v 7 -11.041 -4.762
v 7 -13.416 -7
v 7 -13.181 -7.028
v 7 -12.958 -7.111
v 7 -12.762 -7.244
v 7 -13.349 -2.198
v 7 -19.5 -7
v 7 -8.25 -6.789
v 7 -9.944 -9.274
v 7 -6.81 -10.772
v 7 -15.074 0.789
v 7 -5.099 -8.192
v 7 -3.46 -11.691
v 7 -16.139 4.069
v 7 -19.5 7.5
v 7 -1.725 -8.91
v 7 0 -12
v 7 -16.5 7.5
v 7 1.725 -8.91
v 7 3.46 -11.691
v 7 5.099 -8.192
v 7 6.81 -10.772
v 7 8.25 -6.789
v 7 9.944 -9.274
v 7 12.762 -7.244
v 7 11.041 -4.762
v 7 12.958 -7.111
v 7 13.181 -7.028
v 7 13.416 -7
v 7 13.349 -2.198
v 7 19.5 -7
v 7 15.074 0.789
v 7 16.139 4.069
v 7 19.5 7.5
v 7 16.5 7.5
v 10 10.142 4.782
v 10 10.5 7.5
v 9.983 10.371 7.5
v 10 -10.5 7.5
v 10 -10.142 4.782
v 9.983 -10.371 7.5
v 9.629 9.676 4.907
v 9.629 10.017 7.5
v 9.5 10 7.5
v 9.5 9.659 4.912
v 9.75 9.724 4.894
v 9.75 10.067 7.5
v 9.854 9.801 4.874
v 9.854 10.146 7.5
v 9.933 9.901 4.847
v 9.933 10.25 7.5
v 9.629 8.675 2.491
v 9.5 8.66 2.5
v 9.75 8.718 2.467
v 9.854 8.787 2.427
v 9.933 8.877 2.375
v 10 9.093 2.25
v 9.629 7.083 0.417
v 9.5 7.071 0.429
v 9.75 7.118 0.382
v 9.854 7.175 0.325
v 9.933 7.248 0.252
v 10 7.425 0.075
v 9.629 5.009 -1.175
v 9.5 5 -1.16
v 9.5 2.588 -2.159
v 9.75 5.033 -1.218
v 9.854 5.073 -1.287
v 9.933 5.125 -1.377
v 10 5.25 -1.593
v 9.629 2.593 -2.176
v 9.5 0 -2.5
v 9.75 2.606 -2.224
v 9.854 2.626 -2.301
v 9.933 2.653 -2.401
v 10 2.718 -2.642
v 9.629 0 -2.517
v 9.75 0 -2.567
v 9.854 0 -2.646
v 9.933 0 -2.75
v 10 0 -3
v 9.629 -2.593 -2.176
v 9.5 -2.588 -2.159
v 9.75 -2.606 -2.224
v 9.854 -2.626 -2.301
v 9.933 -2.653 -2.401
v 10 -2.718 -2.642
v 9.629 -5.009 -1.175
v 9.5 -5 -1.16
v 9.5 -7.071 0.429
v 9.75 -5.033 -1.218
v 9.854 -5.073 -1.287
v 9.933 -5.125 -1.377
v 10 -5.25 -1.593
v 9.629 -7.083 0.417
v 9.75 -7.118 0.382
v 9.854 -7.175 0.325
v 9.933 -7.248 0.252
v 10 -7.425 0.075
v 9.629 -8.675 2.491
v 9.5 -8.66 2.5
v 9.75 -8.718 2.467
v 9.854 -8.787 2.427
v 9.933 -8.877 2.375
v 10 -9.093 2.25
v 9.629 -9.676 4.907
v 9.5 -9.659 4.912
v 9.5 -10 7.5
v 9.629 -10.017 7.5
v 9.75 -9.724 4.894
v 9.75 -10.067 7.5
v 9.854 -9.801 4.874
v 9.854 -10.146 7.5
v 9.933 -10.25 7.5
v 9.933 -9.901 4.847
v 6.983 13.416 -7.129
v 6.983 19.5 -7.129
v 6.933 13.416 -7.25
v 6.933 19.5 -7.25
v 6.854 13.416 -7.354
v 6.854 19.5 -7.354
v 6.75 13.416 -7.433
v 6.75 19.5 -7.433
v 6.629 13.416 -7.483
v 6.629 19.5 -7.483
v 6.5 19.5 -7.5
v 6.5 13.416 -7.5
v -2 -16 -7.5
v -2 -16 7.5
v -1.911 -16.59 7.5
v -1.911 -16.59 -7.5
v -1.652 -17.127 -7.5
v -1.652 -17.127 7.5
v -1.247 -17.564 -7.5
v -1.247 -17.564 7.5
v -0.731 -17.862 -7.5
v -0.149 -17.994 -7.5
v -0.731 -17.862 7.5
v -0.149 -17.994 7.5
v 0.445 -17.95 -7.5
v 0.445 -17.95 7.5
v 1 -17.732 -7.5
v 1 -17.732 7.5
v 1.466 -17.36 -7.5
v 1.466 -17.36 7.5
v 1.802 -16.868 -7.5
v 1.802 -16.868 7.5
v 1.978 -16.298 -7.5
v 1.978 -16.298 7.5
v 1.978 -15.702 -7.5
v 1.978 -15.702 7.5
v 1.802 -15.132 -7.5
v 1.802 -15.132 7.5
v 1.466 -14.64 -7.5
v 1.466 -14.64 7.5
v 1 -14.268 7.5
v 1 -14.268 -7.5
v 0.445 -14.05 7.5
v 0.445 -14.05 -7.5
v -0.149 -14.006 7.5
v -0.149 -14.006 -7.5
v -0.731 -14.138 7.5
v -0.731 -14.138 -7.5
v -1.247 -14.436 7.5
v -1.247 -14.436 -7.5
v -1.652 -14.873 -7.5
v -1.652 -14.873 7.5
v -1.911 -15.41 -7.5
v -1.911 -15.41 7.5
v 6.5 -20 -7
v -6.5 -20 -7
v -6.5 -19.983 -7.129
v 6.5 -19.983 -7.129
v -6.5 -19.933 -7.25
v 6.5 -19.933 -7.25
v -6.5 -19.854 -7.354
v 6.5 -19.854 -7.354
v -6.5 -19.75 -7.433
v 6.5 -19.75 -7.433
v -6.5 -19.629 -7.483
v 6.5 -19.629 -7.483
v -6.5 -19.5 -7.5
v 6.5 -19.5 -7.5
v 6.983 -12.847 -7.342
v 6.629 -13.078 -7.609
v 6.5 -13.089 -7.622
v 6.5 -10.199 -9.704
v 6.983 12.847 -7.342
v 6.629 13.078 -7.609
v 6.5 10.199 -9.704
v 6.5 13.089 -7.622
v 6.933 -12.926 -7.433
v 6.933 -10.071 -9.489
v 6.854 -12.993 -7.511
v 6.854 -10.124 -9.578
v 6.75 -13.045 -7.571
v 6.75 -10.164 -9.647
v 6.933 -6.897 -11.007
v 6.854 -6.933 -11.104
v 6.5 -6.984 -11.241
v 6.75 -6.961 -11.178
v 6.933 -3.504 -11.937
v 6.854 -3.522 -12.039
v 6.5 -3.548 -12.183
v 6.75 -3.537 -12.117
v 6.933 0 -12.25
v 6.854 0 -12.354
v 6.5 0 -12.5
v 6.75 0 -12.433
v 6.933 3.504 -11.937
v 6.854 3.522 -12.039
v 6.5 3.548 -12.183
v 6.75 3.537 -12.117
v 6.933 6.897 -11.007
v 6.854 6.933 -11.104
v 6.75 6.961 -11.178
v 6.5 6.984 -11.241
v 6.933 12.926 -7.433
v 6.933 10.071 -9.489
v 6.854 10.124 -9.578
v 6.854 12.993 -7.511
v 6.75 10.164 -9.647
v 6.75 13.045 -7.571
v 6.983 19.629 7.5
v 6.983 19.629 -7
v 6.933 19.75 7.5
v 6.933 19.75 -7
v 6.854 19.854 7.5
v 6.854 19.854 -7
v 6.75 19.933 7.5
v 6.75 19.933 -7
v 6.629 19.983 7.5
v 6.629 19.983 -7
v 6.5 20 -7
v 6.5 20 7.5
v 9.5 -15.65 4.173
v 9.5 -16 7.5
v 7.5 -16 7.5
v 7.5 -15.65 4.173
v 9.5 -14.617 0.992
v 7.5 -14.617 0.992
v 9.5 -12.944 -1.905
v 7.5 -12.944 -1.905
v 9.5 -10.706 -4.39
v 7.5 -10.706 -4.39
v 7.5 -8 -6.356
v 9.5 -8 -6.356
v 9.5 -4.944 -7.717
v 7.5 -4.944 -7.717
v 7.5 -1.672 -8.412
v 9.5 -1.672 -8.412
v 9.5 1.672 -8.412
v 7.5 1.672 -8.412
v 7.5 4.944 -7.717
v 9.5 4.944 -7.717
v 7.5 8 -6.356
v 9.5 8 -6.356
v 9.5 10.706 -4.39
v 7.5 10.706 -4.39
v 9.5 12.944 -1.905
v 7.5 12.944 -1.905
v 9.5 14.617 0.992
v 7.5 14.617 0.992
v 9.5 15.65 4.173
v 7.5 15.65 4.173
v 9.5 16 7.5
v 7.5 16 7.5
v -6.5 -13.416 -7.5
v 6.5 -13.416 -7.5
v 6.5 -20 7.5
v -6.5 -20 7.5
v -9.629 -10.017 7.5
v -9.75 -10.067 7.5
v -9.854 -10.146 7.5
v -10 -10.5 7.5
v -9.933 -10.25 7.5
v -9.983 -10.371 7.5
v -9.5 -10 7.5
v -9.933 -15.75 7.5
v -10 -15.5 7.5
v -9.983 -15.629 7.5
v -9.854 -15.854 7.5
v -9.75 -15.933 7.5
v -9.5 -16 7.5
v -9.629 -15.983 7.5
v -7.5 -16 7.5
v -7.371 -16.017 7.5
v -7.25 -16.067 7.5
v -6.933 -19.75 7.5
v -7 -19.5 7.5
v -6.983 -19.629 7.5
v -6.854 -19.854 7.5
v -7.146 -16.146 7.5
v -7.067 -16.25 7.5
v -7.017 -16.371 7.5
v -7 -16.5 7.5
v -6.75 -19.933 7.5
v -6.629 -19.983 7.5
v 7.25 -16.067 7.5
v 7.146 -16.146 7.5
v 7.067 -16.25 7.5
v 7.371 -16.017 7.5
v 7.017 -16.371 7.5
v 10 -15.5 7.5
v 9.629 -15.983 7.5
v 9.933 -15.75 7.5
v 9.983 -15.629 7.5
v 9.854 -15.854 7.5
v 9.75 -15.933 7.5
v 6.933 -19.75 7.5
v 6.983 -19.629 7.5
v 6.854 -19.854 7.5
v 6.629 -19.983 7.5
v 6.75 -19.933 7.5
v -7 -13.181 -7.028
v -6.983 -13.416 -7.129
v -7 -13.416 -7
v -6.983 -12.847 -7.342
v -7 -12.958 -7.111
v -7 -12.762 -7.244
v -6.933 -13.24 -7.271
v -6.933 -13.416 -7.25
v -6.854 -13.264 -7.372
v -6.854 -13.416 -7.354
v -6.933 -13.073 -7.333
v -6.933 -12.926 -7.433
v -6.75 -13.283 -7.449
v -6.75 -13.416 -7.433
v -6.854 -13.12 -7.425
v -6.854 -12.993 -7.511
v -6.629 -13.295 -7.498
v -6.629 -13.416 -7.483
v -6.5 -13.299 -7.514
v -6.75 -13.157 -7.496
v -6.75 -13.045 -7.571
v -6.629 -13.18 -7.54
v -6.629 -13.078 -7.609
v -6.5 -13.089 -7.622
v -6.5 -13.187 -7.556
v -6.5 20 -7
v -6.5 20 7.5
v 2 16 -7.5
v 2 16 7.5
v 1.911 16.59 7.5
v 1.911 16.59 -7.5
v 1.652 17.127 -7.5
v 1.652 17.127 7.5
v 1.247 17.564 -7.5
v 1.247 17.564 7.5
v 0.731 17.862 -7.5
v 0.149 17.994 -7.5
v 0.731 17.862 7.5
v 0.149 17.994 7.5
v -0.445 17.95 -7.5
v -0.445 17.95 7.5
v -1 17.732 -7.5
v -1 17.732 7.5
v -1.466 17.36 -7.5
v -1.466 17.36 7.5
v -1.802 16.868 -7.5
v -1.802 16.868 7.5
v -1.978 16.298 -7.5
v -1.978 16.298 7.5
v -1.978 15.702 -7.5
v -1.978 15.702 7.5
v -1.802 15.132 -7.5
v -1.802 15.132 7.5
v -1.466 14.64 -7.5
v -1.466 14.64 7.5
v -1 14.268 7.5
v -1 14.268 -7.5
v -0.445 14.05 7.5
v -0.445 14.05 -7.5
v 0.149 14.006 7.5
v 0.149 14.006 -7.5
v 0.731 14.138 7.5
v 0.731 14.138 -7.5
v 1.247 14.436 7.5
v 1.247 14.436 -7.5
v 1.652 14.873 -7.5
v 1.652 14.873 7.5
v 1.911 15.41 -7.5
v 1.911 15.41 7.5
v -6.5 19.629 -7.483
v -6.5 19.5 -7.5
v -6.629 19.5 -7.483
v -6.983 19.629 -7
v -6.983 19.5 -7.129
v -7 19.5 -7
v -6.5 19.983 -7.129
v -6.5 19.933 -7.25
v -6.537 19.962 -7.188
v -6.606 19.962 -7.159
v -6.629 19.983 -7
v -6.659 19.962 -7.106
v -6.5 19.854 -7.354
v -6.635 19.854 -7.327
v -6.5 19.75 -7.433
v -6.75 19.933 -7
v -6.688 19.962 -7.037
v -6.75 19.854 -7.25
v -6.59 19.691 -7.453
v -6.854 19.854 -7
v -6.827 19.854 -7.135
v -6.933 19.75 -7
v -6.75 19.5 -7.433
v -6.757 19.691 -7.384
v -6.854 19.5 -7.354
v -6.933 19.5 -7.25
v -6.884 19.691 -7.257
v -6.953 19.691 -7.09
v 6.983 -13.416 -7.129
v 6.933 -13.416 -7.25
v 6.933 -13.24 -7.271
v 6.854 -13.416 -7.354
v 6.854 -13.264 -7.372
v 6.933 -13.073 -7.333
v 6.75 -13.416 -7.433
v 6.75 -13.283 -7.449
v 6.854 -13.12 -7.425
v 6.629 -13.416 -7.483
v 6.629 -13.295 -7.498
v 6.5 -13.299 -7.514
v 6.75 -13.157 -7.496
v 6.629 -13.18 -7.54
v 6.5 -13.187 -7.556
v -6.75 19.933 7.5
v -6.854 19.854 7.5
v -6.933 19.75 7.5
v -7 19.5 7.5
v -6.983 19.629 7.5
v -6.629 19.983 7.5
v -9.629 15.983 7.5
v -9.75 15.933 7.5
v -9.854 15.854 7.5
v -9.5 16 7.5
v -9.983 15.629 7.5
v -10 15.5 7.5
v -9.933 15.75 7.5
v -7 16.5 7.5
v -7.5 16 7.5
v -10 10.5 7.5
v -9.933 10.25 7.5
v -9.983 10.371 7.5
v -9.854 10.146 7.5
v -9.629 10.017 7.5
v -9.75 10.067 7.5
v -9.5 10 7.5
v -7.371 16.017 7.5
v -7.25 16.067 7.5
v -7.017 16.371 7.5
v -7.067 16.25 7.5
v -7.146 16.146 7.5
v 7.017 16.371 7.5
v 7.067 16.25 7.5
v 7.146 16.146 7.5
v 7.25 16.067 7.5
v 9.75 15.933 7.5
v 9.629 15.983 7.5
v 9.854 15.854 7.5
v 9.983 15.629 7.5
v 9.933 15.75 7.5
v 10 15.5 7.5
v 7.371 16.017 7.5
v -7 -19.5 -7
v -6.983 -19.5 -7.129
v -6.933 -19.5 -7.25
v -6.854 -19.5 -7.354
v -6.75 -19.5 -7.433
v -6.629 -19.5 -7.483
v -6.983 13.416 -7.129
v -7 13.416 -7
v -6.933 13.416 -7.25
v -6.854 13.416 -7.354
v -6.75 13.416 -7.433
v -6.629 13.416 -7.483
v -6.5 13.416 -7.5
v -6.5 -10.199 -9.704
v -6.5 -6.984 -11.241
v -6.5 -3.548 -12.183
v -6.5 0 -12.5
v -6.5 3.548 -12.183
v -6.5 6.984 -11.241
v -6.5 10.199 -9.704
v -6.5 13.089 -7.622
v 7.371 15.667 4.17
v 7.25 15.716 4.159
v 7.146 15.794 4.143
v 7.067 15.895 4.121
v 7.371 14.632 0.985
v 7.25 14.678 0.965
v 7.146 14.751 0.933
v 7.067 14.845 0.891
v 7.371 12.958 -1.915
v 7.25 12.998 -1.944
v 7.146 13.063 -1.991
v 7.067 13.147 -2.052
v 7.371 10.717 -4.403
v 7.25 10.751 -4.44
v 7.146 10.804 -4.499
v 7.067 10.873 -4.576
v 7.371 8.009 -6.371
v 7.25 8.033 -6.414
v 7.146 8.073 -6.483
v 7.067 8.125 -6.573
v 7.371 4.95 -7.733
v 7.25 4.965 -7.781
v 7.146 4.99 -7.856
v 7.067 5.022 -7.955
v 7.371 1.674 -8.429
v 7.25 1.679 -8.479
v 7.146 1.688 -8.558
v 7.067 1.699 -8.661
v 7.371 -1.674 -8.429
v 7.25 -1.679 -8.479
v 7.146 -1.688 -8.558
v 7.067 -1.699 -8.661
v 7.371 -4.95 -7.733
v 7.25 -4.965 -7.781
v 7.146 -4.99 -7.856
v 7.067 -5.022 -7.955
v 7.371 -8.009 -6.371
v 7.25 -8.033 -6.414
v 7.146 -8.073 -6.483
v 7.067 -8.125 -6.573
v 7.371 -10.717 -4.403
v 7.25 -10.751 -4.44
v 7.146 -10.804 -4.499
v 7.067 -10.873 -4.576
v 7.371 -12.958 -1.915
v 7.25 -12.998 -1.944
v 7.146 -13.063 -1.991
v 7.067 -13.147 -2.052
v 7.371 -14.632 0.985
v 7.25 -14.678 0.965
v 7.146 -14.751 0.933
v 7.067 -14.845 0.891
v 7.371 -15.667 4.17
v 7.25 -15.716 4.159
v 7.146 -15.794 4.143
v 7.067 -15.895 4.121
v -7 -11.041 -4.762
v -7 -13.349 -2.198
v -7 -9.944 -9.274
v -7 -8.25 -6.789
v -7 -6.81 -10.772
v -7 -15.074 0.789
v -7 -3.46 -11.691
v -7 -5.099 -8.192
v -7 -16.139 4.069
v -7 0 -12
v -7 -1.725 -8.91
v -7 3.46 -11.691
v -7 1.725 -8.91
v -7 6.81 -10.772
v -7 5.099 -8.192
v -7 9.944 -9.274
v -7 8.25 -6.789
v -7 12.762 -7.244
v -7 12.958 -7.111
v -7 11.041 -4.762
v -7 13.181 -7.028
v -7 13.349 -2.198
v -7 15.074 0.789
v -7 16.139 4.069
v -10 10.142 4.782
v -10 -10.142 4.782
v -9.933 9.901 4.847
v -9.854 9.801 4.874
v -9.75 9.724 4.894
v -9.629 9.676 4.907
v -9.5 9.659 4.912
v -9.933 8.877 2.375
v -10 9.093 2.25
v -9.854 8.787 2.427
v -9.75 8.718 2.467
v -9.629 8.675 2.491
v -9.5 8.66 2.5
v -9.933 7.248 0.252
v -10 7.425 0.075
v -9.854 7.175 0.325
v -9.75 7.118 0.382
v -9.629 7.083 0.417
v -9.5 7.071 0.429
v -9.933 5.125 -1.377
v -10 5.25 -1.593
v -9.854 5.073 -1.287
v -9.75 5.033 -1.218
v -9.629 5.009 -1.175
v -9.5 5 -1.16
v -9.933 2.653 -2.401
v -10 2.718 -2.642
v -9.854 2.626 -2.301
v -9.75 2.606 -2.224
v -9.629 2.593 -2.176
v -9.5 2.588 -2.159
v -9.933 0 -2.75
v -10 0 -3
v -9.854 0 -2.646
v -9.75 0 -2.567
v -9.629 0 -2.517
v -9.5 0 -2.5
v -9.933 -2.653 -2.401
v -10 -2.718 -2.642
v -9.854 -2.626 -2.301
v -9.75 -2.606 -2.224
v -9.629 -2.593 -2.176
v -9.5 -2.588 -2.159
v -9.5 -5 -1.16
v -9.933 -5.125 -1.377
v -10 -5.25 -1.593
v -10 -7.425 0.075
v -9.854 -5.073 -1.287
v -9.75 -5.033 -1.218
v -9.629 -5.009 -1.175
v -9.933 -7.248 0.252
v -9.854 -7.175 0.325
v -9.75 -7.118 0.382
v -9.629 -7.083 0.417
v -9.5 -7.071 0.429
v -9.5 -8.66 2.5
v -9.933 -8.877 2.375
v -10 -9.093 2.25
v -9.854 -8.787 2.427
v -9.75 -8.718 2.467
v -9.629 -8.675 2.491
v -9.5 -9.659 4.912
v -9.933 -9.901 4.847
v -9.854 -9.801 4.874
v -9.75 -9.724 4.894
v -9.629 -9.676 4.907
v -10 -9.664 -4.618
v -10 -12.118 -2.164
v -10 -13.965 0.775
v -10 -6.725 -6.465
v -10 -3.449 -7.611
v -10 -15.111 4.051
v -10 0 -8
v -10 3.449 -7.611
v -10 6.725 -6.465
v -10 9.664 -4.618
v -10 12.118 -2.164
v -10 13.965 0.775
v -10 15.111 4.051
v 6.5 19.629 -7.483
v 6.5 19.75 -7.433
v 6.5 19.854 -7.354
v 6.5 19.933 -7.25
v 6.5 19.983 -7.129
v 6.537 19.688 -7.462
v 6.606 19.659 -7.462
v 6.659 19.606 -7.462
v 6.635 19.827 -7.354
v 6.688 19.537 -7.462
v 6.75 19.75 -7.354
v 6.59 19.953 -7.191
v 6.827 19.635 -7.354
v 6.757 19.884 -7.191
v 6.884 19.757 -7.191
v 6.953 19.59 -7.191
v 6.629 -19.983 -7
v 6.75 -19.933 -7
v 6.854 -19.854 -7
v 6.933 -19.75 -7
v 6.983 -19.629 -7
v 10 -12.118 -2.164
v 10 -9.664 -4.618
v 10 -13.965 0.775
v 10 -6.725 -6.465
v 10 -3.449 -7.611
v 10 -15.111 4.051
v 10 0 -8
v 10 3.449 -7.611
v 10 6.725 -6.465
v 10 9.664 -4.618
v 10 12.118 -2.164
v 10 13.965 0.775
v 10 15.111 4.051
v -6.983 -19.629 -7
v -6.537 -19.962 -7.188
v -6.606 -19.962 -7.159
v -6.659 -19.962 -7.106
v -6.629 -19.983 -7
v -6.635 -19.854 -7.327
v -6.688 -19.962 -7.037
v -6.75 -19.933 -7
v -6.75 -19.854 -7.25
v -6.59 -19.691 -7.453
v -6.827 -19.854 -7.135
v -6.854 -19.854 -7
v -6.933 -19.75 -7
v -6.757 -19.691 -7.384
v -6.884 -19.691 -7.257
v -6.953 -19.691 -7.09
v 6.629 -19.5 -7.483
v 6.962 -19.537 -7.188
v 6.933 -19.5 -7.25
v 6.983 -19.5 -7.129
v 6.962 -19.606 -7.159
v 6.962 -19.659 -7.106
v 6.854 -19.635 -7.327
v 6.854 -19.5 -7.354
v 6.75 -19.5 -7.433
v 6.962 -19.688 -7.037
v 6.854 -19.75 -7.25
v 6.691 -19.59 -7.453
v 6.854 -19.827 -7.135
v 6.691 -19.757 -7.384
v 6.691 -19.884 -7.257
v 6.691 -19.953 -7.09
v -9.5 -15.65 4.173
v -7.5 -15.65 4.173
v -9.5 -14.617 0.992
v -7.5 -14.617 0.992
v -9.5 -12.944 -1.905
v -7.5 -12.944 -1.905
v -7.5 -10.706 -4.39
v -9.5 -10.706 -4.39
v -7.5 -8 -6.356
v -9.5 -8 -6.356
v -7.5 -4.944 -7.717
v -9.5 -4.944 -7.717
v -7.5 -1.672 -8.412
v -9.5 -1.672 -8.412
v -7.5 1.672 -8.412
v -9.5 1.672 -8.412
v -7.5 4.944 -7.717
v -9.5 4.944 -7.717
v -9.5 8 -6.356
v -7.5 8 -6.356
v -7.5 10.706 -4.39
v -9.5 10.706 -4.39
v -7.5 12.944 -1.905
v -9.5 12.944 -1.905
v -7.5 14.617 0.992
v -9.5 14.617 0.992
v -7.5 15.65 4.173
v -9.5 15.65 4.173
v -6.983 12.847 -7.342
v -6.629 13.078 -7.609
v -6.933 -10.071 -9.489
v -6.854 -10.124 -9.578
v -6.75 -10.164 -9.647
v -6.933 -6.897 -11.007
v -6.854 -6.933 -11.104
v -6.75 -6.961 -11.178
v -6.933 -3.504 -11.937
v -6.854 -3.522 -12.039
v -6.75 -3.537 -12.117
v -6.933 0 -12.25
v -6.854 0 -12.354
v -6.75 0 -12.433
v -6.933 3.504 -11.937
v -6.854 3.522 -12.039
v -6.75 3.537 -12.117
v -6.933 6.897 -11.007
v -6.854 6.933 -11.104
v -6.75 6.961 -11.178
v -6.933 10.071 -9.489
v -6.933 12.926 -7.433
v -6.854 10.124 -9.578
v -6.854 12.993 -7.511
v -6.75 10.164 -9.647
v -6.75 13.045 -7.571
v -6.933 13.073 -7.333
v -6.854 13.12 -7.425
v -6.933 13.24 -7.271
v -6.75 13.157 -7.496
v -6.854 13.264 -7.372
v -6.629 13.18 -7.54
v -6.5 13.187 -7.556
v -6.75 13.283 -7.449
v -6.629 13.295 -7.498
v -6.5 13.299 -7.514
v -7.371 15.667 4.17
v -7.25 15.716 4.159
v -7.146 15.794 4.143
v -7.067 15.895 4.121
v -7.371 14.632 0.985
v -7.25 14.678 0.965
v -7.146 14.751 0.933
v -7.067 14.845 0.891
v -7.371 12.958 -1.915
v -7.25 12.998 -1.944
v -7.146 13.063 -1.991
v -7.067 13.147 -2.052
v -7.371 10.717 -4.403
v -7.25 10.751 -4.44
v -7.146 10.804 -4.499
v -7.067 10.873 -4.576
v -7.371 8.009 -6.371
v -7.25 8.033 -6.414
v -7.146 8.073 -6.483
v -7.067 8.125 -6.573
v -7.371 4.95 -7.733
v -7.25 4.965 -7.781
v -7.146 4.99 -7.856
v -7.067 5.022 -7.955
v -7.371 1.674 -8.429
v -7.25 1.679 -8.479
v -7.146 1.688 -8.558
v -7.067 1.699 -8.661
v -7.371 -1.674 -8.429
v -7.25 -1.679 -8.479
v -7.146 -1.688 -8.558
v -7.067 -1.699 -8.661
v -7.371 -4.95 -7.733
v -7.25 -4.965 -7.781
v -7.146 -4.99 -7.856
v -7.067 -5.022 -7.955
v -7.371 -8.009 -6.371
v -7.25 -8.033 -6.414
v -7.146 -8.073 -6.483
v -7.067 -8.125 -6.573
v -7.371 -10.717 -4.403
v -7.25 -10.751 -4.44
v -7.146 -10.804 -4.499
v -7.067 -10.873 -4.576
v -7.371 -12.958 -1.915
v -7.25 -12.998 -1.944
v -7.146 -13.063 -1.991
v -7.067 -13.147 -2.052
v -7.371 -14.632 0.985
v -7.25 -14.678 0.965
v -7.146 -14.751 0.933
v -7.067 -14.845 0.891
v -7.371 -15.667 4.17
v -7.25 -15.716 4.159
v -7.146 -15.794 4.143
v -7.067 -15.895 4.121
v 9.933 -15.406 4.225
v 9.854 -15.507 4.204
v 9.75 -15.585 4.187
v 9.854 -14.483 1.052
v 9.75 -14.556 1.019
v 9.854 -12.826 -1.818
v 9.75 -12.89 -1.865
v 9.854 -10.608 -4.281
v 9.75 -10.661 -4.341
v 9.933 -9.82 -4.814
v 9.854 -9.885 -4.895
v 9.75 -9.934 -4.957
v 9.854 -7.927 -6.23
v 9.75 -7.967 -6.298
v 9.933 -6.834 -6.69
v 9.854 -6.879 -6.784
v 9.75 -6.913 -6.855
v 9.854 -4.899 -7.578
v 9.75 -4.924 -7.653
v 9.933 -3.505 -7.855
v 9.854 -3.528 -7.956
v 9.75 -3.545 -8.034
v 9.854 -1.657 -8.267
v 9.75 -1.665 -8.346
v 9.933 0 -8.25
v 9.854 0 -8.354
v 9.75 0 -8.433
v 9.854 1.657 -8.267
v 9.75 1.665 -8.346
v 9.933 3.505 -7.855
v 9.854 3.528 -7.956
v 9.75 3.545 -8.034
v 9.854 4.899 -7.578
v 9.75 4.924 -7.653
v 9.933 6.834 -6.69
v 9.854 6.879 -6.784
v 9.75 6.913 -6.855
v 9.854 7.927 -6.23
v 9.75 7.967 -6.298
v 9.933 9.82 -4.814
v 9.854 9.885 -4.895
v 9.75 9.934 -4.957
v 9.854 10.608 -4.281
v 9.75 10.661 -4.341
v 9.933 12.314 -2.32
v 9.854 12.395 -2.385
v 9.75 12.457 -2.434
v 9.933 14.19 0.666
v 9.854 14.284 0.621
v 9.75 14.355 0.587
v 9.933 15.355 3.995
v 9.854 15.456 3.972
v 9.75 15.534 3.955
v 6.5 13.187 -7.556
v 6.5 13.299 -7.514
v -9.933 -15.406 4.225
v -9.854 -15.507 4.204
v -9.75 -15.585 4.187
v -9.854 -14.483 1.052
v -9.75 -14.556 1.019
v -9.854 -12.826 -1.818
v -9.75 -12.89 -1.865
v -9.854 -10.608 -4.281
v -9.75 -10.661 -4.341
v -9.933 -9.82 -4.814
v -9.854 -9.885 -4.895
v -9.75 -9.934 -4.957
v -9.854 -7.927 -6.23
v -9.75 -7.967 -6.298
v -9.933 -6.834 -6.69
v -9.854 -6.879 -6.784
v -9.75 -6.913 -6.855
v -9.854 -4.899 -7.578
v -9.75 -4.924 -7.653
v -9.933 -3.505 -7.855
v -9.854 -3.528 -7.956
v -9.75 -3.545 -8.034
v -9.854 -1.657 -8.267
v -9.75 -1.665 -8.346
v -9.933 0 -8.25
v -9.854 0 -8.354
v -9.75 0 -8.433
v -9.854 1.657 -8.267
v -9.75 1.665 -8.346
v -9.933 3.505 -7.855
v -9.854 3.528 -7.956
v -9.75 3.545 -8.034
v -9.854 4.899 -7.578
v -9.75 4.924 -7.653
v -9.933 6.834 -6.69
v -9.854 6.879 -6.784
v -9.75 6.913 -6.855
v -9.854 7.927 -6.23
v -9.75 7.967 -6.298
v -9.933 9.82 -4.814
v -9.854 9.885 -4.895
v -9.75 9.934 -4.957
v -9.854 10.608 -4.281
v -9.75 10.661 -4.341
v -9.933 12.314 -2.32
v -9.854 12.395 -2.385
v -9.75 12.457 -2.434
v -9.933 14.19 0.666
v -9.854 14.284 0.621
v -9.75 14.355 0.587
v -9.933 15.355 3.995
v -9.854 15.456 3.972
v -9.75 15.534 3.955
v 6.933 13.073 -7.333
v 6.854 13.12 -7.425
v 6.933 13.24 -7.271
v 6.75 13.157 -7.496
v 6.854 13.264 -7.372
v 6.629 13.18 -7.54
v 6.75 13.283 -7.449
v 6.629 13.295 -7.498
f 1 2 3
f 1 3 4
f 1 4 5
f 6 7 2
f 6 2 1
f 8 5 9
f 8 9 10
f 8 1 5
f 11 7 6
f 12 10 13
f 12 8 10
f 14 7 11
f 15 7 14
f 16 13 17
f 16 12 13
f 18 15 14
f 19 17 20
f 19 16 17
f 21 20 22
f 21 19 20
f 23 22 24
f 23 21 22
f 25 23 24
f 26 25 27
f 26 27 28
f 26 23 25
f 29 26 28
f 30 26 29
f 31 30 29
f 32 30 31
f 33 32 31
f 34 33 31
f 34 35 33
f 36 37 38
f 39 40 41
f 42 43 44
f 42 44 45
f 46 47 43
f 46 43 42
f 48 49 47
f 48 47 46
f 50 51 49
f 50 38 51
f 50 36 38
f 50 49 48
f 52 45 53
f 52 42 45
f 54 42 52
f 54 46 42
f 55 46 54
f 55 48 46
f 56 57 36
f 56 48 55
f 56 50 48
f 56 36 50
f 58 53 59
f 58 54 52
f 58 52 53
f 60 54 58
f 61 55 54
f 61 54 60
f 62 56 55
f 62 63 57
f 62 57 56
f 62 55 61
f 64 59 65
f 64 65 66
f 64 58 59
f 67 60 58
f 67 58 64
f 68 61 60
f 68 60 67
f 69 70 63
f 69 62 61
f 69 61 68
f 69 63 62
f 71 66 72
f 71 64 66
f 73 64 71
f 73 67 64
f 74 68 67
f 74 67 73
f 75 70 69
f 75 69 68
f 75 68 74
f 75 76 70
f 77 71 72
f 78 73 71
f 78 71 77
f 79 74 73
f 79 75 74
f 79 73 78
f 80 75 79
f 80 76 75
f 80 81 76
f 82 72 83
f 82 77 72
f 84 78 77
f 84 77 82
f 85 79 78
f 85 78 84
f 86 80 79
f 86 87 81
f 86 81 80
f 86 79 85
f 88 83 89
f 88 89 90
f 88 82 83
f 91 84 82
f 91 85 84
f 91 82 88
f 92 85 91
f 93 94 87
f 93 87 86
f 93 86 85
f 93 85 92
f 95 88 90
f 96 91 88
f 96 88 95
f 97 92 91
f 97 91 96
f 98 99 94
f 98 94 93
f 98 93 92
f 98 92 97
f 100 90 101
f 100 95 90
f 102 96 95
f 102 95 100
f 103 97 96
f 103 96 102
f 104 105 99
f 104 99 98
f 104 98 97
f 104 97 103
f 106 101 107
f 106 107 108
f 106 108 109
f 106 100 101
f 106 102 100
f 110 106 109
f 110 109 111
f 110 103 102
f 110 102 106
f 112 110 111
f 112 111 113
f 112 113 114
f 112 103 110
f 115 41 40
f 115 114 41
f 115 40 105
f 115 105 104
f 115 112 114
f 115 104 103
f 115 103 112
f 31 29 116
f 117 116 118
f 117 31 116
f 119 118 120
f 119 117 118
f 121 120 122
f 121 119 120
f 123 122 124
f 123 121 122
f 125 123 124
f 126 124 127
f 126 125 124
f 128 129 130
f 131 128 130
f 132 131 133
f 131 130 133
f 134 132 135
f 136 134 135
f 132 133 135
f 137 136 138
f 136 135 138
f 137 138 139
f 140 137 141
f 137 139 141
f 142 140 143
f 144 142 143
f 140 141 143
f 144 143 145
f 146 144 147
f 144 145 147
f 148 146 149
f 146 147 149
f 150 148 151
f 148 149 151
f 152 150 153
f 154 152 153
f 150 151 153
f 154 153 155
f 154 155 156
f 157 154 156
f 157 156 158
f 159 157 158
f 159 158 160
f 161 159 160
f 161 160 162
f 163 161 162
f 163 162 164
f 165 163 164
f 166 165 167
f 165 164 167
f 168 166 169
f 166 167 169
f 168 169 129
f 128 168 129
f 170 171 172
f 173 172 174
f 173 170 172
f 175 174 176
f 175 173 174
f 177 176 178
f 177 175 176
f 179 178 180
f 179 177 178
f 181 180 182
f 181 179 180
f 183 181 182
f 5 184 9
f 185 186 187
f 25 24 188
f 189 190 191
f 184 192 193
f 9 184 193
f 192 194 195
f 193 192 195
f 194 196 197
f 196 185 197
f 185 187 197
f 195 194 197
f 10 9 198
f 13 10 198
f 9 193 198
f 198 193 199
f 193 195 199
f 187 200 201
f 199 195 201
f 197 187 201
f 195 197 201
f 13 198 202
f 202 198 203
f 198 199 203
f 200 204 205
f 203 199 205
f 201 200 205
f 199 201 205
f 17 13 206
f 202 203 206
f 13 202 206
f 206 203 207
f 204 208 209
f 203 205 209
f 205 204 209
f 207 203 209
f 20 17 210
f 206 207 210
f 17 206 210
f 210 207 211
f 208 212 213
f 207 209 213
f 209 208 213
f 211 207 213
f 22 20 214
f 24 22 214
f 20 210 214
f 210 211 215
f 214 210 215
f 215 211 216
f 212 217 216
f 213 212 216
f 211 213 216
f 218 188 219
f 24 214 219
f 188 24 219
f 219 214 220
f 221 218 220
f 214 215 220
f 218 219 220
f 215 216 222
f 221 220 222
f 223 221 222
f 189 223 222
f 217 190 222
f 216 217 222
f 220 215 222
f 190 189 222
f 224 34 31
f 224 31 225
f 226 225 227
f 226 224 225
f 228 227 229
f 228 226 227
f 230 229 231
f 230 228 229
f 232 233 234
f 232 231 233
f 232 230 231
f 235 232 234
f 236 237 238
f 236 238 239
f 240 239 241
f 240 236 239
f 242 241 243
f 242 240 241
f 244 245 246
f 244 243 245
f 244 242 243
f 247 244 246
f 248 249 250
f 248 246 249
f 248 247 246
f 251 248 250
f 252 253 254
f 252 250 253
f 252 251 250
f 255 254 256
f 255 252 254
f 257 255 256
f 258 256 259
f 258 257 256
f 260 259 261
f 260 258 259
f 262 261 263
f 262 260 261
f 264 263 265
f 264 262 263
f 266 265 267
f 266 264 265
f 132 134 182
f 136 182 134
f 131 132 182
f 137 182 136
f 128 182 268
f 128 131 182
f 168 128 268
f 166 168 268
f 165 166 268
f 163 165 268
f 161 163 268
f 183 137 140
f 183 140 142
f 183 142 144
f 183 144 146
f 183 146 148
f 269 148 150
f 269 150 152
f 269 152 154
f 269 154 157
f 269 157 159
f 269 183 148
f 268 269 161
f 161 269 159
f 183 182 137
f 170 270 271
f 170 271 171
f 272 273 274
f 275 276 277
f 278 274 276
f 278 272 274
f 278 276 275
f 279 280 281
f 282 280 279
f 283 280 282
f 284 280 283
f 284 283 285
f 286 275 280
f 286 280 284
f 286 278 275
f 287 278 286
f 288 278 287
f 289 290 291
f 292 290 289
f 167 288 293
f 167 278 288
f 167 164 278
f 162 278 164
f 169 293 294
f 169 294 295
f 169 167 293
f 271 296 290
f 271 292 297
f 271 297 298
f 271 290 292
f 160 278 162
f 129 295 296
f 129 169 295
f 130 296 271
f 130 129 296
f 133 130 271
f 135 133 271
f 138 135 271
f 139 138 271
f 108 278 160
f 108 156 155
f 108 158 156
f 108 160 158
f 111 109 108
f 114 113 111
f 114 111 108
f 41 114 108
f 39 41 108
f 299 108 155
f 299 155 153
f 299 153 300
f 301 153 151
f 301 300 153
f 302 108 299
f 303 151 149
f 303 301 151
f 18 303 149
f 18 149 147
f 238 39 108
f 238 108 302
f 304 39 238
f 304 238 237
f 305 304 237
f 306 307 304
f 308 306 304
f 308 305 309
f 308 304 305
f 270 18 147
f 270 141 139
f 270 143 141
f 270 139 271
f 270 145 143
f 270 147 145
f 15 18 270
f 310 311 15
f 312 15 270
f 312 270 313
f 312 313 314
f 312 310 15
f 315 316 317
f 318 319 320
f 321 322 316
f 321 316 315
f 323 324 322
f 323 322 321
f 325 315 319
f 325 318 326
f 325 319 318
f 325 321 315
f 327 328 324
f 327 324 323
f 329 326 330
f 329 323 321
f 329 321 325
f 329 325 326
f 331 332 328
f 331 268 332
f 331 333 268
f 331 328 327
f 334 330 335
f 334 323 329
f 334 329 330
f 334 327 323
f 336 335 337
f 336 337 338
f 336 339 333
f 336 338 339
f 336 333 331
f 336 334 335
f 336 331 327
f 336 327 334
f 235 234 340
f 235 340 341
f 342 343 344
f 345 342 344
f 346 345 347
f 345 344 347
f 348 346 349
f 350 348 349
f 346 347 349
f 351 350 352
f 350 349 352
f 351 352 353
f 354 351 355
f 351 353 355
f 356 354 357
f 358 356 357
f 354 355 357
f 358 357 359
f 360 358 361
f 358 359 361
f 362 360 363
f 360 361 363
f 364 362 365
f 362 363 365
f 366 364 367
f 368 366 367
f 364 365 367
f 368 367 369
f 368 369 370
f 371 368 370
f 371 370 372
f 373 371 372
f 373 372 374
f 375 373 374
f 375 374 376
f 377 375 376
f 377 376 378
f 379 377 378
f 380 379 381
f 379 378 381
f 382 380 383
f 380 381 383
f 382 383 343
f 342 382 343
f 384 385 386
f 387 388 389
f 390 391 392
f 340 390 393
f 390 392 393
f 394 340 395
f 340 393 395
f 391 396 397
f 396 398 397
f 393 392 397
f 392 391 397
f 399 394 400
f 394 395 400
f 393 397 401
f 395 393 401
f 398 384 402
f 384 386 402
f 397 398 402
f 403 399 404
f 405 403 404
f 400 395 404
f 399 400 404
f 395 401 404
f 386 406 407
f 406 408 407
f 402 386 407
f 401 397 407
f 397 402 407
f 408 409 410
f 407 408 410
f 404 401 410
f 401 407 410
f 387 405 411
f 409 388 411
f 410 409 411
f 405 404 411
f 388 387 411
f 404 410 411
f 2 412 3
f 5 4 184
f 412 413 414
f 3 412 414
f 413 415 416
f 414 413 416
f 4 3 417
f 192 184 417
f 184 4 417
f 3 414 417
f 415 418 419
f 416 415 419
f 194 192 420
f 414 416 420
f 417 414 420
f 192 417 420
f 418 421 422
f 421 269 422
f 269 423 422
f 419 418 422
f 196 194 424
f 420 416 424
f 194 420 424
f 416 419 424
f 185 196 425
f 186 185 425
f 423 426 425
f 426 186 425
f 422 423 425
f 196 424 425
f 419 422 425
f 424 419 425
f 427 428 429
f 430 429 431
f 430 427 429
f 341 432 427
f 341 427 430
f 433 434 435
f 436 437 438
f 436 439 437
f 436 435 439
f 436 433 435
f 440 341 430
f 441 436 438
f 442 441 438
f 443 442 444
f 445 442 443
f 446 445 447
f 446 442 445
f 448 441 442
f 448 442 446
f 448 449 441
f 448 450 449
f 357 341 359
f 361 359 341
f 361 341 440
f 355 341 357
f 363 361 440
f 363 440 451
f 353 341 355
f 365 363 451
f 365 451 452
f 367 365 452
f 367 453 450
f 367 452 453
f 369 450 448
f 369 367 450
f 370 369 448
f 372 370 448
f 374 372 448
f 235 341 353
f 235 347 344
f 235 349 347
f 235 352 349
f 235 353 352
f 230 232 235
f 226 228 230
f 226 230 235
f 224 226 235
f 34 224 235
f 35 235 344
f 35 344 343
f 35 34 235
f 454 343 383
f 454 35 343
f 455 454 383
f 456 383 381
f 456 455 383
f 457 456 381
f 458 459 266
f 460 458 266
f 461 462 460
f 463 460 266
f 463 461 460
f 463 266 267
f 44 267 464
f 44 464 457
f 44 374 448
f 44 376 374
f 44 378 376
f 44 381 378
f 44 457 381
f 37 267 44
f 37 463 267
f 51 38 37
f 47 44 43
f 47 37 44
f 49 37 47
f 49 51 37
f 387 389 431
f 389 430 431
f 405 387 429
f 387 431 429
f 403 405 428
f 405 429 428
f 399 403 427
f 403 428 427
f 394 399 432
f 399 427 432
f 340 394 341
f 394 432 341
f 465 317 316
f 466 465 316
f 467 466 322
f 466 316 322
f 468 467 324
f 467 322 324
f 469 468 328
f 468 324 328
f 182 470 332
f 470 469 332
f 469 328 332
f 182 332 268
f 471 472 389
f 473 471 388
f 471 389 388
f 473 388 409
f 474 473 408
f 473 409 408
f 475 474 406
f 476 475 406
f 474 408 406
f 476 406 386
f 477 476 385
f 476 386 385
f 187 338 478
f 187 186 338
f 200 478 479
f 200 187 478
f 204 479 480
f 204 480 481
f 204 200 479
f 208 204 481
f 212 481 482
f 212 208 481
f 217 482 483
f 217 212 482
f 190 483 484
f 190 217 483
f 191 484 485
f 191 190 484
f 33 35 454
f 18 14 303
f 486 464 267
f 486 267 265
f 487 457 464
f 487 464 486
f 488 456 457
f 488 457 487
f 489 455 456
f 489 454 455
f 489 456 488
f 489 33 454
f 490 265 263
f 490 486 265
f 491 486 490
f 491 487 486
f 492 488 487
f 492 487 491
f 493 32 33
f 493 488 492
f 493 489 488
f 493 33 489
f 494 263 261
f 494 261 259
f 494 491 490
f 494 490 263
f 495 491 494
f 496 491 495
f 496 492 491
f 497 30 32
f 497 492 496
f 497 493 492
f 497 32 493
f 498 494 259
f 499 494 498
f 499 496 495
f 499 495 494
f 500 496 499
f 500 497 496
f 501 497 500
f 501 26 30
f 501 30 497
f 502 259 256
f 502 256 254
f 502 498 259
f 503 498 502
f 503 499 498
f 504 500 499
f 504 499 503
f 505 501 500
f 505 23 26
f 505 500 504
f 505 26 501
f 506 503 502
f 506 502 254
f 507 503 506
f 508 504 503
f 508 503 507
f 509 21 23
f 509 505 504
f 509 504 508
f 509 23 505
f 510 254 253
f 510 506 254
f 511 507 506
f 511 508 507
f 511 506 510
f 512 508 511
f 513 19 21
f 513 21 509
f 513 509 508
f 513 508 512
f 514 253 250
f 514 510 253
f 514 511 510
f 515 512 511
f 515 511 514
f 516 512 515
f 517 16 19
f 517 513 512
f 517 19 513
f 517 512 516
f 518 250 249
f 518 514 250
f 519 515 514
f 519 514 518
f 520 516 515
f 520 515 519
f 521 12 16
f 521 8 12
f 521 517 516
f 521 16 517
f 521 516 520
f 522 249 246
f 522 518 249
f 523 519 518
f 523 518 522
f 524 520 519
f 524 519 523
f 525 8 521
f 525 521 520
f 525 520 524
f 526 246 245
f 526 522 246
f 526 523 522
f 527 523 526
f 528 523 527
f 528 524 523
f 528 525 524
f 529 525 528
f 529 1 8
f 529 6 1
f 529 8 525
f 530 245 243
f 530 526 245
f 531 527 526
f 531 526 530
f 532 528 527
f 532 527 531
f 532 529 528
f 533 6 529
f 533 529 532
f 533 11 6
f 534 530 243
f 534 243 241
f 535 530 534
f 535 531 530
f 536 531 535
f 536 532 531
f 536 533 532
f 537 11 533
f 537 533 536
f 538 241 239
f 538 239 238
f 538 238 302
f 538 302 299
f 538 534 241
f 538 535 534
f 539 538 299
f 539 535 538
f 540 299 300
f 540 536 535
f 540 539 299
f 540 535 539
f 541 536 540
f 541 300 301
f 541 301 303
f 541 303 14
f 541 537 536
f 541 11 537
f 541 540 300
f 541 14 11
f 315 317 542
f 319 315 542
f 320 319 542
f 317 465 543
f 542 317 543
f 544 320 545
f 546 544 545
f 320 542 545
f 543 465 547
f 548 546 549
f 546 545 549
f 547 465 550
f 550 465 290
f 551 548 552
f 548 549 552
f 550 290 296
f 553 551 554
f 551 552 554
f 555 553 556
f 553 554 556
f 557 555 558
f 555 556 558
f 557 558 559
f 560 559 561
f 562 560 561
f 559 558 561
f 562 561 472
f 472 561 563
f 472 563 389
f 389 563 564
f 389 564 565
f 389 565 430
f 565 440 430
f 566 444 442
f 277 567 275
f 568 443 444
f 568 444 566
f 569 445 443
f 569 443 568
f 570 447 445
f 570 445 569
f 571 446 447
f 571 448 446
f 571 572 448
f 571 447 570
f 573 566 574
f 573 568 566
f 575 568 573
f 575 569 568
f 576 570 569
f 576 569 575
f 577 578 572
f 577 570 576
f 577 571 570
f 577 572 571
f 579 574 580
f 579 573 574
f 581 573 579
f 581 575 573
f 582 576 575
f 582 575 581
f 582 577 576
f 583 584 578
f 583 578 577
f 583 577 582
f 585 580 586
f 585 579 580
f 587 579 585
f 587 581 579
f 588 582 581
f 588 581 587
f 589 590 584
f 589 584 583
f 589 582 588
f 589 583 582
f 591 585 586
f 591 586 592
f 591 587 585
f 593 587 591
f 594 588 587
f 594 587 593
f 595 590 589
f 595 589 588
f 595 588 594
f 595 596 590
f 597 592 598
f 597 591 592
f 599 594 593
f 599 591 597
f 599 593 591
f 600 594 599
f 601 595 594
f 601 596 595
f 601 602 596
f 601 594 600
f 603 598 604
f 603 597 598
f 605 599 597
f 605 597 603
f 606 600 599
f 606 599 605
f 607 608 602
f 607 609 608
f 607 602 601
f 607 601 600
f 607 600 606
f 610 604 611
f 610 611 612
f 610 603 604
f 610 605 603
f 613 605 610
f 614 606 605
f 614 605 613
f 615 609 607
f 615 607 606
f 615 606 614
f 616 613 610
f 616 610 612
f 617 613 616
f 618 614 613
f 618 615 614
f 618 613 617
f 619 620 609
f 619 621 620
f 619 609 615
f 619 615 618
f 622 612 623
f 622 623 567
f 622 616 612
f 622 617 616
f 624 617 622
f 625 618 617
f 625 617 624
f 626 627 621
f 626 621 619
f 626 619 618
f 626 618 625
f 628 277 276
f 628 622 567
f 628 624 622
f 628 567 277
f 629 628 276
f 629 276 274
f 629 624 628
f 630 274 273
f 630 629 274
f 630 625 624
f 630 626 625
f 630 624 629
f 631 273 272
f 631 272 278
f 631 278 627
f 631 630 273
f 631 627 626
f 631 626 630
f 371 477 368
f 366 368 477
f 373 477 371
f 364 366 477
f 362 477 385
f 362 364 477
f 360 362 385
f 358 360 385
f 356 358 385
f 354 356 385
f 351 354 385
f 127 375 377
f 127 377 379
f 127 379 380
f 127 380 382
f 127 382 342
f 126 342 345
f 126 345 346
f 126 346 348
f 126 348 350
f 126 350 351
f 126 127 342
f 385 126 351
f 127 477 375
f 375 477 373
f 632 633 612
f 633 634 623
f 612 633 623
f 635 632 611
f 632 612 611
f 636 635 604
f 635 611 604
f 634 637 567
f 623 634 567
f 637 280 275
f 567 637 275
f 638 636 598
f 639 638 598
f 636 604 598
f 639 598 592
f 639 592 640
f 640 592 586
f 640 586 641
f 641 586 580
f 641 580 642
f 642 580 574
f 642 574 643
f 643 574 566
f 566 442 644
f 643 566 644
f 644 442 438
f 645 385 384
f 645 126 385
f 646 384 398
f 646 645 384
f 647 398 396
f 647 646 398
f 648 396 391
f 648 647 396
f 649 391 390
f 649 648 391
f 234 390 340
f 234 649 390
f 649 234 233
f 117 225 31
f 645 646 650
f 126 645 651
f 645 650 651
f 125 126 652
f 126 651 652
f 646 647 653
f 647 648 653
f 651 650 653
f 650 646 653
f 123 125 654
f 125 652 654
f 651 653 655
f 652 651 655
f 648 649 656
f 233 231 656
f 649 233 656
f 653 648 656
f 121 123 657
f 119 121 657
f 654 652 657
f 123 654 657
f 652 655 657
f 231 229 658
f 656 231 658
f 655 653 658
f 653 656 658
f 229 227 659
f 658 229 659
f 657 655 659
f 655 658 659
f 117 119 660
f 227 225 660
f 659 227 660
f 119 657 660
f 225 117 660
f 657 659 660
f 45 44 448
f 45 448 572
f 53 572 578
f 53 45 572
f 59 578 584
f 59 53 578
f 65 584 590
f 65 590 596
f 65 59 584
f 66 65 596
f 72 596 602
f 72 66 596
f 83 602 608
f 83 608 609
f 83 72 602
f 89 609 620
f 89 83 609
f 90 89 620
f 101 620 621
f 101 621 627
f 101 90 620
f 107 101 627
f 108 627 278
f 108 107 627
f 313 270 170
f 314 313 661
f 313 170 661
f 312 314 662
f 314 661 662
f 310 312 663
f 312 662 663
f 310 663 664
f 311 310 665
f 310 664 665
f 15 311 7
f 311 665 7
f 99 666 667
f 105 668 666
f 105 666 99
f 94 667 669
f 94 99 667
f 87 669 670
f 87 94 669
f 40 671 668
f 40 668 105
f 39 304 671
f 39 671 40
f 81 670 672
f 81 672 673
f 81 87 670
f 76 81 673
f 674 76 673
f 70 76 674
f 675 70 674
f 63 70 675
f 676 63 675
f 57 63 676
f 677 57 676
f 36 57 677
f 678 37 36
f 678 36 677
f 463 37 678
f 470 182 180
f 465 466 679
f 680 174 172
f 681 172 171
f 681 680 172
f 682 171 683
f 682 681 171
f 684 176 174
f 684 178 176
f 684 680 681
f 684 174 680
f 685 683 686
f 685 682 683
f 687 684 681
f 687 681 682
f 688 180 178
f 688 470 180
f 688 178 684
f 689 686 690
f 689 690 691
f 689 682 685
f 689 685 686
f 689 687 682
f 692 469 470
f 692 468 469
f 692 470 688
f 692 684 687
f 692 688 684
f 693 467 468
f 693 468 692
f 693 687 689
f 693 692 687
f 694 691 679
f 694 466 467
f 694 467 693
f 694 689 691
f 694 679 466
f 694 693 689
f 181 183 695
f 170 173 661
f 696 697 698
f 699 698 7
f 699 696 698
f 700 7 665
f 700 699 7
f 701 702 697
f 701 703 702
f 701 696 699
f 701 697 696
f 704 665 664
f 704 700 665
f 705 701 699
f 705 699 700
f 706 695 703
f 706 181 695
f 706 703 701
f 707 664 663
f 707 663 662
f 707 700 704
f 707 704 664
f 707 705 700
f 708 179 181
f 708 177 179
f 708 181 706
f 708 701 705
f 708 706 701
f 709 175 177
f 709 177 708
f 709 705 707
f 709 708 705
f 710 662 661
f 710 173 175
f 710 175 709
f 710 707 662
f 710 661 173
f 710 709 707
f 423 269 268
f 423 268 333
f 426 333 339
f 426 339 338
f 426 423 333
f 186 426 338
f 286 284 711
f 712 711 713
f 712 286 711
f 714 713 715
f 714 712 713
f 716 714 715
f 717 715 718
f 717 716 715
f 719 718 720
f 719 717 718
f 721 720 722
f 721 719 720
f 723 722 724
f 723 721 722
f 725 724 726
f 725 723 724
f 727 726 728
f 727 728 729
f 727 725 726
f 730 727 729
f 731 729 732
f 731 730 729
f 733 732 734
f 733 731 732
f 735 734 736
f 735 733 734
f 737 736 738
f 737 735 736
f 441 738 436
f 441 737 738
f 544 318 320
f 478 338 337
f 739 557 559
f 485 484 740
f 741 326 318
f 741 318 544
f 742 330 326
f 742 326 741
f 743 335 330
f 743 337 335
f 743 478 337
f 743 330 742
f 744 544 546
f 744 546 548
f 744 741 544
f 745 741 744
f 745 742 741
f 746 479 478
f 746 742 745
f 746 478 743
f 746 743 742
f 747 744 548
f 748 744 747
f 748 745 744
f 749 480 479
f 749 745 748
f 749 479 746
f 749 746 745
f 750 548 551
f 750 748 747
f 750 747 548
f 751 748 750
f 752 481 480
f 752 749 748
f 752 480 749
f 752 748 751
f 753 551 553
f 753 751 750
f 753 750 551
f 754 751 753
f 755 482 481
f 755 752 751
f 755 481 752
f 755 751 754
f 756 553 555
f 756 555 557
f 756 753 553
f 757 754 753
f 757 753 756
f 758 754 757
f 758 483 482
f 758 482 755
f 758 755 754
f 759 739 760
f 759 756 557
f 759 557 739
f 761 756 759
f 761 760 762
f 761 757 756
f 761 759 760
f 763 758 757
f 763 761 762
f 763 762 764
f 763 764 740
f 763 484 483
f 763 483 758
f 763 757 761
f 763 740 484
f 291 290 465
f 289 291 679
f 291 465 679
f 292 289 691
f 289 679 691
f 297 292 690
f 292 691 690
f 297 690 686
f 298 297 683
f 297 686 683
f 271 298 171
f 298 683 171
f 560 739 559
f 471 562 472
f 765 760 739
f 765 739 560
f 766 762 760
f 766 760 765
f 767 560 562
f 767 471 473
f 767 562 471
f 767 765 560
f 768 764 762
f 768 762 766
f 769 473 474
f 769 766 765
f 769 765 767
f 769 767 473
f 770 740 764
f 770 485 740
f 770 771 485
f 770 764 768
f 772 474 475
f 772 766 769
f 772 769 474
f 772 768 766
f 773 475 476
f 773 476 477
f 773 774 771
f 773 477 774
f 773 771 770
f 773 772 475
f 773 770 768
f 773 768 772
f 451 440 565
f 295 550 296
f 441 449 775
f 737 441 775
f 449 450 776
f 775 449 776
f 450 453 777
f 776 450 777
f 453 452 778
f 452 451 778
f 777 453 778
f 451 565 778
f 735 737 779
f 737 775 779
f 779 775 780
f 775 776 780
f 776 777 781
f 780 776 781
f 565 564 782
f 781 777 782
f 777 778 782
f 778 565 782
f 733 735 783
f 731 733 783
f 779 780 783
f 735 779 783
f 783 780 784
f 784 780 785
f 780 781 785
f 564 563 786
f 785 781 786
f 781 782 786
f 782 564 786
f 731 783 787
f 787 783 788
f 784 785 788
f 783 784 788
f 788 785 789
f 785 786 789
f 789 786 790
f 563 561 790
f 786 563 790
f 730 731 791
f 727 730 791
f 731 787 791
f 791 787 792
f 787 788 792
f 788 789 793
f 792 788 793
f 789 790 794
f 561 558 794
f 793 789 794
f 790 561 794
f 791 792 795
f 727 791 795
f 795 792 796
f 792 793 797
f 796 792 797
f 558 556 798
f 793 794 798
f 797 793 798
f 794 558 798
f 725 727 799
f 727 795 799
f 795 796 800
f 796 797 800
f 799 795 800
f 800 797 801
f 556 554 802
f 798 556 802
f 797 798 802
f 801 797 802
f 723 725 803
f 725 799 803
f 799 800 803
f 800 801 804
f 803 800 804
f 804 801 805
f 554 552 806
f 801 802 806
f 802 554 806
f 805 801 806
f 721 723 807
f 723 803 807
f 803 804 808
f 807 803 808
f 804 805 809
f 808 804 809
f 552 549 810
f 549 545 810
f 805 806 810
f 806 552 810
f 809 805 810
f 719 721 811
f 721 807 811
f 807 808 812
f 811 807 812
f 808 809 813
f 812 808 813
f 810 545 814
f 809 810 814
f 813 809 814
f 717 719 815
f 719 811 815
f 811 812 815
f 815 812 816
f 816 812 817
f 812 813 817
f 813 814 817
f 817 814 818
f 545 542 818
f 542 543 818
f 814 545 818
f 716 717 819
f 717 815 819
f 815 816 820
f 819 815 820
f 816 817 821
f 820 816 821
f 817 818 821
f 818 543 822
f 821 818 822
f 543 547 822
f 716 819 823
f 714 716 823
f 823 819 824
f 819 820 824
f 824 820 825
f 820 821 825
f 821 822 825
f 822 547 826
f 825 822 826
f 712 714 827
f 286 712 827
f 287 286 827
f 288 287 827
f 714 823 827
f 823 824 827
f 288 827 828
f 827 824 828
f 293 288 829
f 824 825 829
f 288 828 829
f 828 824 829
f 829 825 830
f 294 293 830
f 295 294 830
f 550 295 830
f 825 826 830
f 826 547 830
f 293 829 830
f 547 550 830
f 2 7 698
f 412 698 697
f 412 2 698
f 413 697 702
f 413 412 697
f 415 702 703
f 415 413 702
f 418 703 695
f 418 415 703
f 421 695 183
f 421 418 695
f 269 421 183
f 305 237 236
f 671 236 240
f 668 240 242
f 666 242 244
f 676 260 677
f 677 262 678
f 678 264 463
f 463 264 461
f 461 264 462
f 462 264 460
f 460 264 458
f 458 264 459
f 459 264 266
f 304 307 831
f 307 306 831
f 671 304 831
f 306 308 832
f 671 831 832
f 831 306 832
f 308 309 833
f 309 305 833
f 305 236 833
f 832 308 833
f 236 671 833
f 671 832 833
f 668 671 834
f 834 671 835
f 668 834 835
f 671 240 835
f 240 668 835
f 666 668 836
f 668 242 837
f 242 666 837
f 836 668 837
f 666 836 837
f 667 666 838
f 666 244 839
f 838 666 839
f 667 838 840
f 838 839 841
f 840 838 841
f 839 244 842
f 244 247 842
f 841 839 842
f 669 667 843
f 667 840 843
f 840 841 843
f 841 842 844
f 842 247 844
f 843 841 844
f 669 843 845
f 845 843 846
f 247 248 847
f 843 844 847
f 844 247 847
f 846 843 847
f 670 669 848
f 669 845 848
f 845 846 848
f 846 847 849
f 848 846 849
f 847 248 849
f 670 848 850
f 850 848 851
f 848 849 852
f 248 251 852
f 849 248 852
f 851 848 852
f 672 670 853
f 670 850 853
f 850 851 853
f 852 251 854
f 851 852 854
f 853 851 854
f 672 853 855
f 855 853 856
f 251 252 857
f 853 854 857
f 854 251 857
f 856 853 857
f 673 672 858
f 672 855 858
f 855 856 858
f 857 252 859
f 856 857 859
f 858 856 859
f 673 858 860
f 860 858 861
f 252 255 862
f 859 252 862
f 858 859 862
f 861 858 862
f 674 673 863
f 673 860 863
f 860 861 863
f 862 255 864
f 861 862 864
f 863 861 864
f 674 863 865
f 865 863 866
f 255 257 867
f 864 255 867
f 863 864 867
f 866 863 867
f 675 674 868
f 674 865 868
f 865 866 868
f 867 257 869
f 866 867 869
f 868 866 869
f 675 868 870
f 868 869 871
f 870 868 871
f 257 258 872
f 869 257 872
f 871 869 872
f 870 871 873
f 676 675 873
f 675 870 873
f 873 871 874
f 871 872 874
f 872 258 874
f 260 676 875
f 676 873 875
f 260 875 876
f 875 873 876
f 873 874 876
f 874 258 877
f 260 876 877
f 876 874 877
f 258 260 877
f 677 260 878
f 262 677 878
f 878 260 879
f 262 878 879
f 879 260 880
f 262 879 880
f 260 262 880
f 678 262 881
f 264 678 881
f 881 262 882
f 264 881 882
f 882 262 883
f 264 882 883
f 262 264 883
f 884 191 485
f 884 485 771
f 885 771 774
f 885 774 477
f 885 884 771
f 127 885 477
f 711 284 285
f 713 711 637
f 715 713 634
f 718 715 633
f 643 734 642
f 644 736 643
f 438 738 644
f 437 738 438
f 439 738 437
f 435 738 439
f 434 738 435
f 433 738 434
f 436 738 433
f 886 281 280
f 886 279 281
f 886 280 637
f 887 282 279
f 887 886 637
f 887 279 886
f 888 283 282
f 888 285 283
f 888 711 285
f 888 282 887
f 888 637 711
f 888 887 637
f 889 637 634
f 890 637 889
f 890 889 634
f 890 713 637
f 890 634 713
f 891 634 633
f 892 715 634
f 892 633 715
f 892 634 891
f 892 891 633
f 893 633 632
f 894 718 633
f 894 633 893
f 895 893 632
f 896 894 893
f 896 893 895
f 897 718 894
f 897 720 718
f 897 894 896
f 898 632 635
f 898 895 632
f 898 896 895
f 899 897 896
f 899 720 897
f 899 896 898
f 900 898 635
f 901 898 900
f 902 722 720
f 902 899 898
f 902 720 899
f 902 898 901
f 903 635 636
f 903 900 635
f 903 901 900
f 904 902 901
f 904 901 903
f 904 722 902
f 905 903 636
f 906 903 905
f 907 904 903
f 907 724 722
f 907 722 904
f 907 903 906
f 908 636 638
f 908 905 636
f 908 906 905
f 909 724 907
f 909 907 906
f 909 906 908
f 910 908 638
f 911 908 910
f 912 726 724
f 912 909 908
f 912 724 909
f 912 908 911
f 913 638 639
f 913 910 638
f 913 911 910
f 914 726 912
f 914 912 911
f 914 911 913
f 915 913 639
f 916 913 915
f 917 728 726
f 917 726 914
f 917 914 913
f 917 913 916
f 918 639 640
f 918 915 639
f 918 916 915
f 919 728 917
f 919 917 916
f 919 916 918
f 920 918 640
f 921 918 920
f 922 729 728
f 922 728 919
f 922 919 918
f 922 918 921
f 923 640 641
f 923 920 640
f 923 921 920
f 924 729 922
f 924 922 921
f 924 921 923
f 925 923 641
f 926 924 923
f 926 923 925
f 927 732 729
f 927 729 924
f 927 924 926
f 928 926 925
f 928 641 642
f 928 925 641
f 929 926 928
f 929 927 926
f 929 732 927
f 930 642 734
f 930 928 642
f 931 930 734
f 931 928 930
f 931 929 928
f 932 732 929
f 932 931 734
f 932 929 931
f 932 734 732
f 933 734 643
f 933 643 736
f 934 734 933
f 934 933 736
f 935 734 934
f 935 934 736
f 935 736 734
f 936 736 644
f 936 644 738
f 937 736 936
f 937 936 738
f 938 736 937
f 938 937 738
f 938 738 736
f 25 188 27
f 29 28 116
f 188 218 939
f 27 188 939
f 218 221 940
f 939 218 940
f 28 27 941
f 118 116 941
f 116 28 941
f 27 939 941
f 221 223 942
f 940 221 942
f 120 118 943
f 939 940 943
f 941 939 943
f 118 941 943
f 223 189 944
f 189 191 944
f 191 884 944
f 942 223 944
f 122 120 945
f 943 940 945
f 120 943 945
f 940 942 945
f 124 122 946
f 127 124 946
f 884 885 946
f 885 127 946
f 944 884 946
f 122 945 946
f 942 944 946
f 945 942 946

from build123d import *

# Parameters (mm, degrees)
BOSS_EXTRUDE1_DEPTH = 10
BOSS_EXTRUDE2_DEPTH = 7
SKETCH2_R           = 2
CUT_EXTRUDE1_DEPTH  = 15
FILLET1_R           = 0.5


with BuildPart() as part:
    # Sketch1 → Boss-Extrude1 (new, symmetric)
    with BuildSketch(Plane.YZ):
        with BuildLine():
            Line((-10, 7.5), (-16, 7.5))
            ThreePointArc((-16, 7.5), (0, -8.5), (16, 7.5))
            Line((16, 7.5), (10, 7.5))
            ThreePointArc((10, 7.5), (0, -2.5), (-10, 7.5))
        make_face()
    extrude(amount=BOSS_EXTRUDE1_DEPTH, both=True)

    # Sketch1<3> → Boss-Extrude2 (add, symmetric)
    with BuildSketch(Plane.YZ):
        with BuildLine():
            Line((-16, 7.5), (-20, 7.5))
            Line((-20, 7.5), (-20, -7.5))
            Line((-20, -7.5), (-13.228756555, -7.5))
            ThreePointArc((-13.228756555, -7.5), (0, -12.5), (13.228756555, -7.5))
            Line((13.228756555, -7.5), (20, -7.5))
            Line((20, -7.5), (20, 7.5))
            Line((20, 7.5), (16, 7.5))
            ThreePointArc((16, 7.5), (0, -8.5), (-16, 7.5))
        make_face()
    extrude(amount=BOSS_EXTRUDE2_DEPTH, both=True)

    # Sketch2 → Cut-Extrude1 (cut)
    with BuildSketch(Plane.XY.offset(7.5)):
        with Locations((0, 16)):
            Circle(SKETCH2_R)
        with Locations((0, -16)):
            Circle(SKETCH2_R)
    extrude(amount=-CUT_EXTRUDE1_DEPTH, mode=Mode.SUBTRACT)

    # Fillet1
    fillet1_edges = [part.edges().sort_by_distance(p)[0] for p in [
        (-7, 0, -12.5),
        (0, 13.228756555, -7.5),
        (-7, 16.614378278, -7.5),
        (0, -13.228756555, -7.5),
        (7, 0, -12.5),
        (-7, -16.614378278, -7.5),
        (0, 20, -7.5),
        (7, 16.614378278, -7.5),
        (-7, 20, 0),
        (7, -16.614378278, -7.5),
        (0, -20, -7.5),
        (-7, -20, 0),
        (7, 20, 0),
        (7, -20, 0),
        (-7, 0, -8.5),
        (7, 0, -8.5),
        (-10, 0, -8.5),
        (10, 0, -8.5),
        (-10, 0, -2.5),
        (10, 0, -2.5),
    ]]
    fillet(fillet1_edges, radius=FILLET1_R)


solid = part.part
